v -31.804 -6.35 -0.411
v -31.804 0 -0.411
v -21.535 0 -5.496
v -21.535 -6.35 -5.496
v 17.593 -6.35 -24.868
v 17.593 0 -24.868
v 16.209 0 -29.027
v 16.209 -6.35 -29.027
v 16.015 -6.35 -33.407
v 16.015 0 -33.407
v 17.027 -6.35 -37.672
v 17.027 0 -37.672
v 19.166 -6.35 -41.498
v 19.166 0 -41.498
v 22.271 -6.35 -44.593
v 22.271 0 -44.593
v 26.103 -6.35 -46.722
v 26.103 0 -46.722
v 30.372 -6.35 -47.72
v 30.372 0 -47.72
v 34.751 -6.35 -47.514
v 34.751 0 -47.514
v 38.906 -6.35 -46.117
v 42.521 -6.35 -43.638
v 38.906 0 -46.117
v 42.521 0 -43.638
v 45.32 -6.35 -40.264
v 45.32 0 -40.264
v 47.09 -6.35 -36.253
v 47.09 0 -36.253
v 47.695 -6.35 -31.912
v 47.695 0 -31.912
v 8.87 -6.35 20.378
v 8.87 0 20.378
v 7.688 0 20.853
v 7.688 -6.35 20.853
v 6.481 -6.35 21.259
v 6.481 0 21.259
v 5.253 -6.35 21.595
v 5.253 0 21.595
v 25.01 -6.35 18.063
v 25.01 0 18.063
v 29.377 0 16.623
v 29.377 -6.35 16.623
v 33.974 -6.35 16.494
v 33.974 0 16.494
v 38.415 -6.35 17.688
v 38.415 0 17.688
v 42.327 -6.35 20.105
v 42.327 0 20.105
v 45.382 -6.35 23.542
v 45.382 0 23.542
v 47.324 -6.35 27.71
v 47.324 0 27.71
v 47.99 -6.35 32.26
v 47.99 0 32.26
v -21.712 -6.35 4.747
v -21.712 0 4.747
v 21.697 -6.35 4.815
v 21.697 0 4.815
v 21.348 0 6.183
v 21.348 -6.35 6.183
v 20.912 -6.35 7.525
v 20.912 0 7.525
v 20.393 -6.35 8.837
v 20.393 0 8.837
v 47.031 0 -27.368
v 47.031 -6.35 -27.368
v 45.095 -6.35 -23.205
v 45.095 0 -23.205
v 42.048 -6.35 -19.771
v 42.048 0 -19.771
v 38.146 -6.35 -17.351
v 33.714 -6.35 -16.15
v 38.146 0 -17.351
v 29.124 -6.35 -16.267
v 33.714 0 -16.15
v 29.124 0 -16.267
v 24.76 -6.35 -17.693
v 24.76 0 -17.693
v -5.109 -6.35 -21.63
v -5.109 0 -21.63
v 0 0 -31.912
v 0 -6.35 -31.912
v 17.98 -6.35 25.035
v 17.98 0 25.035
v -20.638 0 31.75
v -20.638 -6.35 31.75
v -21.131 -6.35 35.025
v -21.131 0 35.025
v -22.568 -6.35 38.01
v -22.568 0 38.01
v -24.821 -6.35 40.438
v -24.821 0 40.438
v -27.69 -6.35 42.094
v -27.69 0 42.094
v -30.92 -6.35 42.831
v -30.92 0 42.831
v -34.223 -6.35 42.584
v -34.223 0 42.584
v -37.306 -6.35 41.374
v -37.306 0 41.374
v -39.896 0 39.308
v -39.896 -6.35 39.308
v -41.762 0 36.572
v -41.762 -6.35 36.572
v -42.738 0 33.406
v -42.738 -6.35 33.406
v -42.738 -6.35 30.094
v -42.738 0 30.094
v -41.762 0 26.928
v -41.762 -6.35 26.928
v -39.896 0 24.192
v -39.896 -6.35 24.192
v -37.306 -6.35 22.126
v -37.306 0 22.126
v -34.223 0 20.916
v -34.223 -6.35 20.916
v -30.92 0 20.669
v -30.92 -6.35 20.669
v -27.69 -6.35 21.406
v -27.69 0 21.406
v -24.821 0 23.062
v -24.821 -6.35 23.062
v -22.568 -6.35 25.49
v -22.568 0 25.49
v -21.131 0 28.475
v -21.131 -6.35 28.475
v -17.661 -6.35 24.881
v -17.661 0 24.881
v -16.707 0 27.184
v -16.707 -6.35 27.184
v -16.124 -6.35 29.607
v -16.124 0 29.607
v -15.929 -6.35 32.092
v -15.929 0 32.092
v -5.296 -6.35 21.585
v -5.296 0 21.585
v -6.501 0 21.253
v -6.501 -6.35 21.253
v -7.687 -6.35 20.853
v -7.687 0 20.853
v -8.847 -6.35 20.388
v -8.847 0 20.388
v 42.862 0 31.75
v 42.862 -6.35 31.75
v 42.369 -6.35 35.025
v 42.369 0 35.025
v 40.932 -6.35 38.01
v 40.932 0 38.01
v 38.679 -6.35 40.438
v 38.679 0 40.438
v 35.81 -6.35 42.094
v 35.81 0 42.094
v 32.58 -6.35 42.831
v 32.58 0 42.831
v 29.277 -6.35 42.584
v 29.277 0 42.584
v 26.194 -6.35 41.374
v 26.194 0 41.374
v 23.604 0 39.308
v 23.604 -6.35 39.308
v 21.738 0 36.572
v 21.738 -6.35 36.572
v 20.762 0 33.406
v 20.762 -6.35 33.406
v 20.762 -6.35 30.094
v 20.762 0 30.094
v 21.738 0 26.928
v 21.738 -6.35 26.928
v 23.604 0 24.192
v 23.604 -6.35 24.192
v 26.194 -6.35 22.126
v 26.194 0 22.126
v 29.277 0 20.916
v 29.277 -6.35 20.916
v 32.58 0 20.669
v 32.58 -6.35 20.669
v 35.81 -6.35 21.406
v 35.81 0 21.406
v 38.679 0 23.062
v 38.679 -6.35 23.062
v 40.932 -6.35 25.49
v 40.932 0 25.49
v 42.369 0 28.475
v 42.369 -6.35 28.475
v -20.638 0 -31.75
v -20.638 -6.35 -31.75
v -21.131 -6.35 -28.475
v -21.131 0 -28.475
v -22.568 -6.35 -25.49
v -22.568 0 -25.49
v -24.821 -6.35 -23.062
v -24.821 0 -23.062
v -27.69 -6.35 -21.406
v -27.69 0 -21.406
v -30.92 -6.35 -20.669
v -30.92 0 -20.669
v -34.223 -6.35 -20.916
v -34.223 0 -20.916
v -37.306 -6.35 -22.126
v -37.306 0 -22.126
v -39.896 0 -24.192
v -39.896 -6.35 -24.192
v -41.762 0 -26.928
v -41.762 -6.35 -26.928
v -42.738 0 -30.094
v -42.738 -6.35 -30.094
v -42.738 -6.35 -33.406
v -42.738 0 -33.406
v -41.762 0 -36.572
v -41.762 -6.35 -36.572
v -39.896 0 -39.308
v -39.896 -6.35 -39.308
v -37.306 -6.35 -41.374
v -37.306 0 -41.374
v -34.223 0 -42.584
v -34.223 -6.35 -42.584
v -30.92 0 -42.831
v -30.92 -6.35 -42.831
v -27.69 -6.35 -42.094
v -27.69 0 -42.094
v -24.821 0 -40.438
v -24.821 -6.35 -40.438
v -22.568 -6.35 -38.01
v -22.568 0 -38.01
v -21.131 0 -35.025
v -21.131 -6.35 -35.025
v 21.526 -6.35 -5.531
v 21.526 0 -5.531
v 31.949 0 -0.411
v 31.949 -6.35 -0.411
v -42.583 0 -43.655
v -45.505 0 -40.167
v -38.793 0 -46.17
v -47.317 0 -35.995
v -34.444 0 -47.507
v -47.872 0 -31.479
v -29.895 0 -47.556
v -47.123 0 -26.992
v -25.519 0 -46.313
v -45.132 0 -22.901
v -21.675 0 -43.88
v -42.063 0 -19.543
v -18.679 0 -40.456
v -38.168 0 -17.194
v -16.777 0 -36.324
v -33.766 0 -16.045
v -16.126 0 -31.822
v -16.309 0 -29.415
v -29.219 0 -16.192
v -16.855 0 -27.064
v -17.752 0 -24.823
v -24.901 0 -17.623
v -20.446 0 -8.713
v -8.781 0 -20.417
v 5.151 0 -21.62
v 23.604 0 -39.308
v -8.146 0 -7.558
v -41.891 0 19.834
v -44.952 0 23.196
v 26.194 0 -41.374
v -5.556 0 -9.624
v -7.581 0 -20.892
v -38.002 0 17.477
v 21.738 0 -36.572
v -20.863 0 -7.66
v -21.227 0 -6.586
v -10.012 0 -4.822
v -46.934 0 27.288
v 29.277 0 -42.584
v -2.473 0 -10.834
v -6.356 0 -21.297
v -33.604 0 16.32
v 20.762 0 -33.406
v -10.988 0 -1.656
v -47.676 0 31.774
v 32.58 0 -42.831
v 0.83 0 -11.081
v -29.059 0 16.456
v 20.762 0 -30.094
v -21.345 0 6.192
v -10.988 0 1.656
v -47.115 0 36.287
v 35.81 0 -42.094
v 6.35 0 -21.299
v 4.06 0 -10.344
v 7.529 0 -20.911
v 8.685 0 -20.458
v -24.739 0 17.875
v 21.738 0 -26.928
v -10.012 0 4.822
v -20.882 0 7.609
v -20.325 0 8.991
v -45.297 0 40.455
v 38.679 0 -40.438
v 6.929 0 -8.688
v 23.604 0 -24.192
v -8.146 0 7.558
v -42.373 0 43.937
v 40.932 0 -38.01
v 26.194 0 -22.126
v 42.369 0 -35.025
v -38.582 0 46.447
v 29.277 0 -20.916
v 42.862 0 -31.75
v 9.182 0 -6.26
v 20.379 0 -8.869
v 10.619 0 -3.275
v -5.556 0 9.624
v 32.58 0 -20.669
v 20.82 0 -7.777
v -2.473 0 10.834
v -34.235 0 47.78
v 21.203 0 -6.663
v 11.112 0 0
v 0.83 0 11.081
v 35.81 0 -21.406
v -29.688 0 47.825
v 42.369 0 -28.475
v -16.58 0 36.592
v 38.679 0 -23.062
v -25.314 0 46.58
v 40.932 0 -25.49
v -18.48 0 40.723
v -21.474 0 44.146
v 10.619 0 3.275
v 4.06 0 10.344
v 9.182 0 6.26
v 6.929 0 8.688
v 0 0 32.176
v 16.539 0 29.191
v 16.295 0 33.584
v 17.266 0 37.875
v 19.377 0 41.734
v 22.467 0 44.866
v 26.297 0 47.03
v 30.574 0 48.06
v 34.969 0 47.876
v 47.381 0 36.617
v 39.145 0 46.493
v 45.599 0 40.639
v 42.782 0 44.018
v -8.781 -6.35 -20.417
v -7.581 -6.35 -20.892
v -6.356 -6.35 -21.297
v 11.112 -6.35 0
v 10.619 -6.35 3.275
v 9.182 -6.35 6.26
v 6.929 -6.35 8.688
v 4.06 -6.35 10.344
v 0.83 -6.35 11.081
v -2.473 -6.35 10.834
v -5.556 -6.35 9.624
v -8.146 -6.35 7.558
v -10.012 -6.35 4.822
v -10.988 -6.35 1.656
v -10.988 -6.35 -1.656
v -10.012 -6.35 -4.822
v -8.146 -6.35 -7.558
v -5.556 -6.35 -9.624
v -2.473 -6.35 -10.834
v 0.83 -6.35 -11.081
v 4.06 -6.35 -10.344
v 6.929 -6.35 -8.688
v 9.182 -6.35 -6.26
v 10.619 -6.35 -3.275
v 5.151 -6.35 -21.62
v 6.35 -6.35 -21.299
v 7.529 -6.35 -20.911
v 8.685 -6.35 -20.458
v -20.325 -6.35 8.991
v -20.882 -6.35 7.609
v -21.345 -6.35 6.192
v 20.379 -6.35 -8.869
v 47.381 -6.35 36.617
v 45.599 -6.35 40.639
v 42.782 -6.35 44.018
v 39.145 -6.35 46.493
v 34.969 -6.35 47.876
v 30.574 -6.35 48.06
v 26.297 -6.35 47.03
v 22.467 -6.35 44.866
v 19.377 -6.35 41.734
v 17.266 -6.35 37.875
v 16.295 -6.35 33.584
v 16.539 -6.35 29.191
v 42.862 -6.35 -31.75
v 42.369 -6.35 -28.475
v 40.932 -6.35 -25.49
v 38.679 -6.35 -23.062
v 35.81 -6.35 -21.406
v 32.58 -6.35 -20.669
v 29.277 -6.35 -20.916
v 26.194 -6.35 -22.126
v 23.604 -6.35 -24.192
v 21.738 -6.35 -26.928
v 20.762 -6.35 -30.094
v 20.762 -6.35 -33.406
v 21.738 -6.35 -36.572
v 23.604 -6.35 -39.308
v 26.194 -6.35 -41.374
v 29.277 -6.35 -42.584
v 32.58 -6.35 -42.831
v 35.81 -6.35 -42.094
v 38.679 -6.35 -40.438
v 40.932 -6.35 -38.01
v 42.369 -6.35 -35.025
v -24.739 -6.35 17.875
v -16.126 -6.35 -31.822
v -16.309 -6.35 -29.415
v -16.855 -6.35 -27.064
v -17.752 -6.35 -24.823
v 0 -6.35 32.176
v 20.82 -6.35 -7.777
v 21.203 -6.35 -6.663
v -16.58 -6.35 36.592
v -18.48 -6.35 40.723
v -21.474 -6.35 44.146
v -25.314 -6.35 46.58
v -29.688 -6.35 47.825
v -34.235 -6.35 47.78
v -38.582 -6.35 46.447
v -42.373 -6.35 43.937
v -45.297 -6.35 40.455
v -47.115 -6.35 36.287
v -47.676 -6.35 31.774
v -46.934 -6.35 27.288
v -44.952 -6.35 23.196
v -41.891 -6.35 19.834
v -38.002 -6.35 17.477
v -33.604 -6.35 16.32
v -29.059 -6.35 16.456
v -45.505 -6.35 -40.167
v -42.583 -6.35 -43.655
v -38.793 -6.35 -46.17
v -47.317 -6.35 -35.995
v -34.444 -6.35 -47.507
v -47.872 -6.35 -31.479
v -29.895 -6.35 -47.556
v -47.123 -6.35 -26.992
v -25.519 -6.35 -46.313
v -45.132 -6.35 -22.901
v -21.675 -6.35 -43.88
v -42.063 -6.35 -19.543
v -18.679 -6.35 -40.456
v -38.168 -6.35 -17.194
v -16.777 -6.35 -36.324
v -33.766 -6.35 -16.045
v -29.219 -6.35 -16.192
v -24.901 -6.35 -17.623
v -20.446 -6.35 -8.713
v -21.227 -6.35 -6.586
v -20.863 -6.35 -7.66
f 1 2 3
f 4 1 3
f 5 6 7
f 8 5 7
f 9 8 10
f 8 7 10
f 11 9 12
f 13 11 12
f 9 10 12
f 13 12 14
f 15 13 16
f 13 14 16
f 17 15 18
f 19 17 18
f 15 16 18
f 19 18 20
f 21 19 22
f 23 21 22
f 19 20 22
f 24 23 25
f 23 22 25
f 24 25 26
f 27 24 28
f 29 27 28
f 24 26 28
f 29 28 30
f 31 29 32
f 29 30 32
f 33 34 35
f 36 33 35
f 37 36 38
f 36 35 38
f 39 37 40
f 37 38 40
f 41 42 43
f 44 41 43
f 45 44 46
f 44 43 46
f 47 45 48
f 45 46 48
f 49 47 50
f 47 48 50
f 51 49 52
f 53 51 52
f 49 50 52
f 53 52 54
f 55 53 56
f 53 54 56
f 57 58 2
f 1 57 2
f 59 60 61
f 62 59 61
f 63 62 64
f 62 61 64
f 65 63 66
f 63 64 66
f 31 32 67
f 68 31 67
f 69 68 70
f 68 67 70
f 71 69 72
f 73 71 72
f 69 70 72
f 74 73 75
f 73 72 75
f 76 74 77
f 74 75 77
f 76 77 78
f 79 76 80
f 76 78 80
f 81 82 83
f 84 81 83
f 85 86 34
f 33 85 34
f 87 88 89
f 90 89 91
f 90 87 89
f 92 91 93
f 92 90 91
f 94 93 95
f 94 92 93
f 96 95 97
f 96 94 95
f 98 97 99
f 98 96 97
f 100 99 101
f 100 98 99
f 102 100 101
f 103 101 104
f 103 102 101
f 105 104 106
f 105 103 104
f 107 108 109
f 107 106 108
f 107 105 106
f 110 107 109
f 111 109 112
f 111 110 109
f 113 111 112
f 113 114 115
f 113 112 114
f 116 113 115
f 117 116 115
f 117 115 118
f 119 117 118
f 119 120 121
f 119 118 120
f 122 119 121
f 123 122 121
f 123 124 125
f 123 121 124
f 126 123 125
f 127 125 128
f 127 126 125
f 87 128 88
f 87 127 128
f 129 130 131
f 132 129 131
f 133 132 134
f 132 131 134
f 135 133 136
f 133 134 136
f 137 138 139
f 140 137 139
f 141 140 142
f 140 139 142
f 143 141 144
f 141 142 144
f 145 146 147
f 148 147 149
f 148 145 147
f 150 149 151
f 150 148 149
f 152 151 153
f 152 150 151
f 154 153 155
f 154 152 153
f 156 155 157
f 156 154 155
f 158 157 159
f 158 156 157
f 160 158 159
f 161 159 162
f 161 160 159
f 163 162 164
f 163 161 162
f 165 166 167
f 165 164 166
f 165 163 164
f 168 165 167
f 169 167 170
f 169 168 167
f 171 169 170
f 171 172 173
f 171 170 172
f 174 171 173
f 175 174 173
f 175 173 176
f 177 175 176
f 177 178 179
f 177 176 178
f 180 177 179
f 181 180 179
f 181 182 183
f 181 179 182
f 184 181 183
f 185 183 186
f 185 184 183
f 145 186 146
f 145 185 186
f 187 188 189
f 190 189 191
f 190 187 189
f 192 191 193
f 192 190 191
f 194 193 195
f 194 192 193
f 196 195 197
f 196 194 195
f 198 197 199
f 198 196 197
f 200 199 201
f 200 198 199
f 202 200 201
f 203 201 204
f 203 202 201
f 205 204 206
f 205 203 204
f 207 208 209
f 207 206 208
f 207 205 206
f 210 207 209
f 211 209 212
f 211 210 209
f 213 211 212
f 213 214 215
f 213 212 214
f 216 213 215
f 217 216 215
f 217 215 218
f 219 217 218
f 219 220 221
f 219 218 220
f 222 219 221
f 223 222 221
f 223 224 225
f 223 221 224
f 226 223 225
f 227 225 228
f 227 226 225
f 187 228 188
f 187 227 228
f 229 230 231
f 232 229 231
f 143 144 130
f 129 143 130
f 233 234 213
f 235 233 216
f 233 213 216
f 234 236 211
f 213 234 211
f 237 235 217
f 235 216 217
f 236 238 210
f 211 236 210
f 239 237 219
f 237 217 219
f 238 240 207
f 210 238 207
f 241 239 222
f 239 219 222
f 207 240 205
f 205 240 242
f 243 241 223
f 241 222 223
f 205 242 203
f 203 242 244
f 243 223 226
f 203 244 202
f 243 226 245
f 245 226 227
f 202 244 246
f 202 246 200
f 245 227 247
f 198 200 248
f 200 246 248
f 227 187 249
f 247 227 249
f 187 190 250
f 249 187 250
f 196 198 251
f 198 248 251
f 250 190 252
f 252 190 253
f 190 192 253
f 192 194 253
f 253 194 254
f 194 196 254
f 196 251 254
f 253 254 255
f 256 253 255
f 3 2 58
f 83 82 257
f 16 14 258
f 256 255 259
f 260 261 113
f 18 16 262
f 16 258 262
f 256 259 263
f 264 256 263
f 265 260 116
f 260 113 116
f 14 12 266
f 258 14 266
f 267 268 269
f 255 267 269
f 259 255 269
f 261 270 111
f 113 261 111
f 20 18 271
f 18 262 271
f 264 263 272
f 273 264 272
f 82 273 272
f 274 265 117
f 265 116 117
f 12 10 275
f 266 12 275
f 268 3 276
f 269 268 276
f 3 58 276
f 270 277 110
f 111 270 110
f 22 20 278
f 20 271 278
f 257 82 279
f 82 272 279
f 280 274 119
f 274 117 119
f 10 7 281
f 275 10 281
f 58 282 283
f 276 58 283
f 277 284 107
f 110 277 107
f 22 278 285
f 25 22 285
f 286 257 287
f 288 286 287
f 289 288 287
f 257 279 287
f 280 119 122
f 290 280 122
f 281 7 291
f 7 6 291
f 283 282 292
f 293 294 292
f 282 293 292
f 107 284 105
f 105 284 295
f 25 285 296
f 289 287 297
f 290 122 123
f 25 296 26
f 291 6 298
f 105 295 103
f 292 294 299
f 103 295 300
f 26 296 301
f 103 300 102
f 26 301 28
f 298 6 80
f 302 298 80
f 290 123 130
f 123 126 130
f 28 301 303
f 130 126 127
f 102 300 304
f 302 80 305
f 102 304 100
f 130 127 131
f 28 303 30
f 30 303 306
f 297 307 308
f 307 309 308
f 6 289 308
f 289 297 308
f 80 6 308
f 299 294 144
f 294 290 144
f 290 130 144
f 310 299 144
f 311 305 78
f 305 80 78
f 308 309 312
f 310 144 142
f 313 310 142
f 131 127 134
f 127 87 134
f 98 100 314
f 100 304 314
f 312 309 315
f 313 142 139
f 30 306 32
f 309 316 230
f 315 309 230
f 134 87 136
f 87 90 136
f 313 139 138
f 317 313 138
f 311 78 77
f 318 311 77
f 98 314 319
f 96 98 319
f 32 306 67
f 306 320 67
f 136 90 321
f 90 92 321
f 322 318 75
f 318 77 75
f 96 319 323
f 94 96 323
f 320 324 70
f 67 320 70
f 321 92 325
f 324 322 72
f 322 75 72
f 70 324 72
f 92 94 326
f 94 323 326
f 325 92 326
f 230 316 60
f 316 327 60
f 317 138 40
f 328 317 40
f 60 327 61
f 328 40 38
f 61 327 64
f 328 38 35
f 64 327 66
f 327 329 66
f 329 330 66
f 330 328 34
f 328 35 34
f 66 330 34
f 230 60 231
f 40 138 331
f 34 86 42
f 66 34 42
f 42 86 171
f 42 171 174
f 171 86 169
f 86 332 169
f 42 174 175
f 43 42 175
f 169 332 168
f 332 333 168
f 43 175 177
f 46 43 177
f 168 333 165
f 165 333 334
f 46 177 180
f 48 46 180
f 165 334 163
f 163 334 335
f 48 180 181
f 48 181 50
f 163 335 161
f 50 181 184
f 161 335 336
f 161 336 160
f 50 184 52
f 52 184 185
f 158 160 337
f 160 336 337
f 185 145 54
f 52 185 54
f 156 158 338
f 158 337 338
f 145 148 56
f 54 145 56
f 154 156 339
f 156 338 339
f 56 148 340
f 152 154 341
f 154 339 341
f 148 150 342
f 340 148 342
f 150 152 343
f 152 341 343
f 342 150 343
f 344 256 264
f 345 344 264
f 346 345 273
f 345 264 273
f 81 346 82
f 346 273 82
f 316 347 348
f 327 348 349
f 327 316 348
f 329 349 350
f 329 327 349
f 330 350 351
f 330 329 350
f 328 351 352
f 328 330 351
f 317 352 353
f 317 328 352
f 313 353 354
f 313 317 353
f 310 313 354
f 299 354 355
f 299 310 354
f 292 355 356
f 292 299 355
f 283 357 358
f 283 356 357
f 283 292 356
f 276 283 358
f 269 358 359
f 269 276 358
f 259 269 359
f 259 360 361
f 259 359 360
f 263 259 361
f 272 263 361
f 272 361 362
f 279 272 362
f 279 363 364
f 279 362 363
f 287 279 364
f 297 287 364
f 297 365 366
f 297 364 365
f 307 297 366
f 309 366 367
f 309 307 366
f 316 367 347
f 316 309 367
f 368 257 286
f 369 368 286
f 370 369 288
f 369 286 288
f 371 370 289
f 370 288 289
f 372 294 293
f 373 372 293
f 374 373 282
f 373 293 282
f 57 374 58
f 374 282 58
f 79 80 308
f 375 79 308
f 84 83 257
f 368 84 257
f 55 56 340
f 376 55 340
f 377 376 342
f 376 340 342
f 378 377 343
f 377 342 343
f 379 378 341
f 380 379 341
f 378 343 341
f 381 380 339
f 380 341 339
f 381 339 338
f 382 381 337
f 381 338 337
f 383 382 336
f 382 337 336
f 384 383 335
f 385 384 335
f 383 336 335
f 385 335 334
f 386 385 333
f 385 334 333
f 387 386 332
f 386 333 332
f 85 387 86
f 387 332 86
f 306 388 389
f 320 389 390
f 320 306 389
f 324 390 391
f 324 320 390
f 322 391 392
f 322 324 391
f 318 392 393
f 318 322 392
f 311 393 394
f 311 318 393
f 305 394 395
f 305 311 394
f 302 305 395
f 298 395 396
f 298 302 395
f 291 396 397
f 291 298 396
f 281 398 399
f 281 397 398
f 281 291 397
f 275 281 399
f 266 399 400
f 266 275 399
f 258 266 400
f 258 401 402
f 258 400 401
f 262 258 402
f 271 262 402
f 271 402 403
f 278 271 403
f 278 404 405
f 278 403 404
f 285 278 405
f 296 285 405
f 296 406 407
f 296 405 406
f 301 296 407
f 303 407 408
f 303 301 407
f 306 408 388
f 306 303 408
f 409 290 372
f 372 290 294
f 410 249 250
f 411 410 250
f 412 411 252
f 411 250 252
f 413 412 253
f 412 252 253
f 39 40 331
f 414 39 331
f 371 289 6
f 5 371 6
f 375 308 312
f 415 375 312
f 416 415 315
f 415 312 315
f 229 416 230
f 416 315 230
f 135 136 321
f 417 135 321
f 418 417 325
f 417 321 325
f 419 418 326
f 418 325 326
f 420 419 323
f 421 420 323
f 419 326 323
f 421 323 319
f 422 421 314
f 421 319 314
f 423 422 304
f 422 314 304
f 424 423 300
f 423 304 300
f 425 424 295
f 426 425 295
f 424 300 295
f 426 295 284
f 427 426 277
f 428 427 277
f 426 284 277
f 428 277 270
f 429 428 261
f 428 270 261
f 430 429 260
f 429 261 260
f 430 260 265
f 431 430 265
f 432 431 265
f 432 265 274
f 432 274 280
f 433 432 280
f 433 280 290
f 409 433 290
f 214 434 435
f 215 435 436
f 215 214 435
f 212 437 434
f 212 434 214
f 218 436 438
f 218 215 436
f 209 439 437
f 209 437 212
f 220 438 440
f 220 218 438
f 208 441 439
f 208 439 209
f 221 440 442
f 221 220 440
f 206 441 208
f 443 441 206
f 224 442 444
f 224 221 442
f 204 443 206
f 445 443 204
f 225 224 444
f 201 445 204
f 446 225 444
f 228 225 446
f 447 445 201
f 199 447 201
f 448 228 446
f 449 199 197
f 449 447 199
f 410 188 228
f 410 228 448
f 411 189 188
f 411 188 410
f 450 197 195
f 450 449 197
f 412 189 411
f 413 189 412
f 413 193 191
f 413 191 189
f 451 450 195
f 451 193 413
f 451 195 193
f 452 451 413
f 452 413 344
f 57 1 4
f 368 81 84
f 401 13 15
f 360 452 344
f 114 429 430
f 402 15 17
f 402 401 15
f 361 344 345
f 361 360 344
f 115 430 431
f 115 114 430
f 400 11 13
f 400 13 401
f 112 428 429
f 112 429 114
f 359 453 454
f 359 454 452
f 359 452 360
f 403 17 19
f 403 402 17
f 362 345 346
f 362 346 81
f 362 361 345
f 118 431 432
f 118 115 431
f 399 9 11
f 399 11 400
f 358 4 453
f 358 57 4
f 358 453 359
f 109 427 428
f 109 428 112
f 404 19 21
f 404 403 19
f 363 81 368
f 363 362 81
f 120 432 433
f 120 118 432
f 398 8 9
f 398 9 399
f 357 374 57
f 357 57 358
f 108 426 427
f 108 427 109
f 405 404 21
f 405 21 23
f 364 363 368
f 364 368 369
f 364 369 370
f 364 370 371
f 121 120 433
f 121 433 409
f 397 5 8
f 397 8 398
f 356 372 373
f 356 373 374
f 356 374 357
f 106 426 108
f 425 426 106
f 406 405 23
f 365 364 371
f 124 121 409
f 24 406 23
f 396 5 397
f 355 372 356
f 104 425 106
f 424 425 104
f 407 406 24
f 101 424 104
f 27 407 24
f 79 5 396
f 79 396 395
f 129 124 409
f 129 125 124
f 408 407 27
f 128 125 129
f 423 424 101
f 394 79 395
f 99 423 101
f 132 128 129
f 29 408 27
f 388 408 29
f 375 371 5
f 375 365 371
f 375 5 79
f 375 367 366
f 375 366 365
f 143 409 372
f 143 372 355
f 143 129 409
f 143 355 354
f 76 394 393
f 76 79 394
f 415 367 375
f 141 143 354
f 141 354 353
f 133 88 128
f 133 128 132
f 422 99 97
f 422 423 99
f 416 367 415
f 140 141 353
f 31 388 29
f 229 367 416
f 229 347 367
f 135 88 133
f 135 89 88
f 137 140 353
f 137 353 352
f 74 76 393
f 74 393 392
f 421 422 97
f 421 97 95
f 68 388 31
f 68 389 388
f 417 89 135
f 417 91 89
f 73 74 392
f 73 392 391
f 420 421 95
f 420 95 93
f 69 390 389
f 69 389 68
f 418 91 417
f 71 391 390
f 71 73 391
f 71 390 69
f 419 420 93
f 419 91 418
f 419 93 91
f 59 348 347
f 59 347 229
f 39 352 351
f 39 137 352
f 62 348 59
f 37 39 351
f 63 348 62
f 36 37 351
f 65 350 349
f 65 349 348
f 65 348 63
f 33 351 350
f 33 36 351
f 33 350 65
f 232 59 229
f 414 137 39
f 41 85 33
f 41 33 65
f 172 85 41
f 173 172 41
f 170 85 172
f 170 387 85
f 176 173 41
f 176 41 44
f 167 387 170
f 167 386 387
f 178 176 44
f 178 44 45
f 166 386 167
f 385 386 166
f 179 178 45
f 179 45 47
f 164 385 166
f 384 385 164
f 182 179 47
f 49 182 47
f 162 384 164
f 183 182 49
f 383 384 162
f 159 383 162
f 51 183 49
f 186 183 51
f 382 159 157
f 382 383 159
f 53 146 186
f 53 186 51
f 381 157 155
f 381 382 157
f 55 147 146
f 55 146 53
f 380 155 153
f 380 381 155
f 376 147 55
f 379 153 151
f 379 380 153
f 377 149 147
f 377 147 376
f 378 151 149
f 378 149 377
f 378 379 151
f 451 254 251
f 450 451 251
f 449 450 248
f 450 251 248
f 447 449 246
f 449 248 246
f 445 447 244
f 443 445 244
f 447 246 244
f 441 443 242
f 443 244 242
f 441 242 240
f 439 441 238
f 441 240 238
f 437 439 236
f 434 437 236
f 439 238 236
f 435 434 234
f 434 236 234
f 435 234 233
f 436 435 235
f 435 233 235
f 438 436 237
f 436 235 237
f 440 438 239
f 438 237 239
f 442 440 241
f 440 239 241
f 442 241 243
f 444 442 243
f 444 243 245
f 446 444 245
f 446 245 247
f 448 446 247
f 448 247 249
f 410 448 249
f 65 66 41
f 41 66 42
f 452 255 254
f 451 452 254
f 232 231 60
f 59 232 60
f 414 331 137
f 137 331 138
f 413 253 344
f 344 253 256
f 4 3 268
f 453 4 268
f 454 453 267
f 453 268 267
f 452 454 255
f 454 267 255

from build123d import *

# Parameters (mm, degrees)
F1_DEPTH = 6.35
F2_R     = 11.1125
F3_DEPTH = 6.351
F4_R     = 21.59
F5_DEPTH = 6.35
F6_R     = 11.1125
F7_DEPTH = 6.351


with BuildPart() as f1:
    # F0 (on Front) → F1 (new body)
    with BuildSketch(Plane.XZ):
        with BuildLine():
            ThreePointArc((21.5257779082, -5.5309592701), (22.0495015704, -2.787490896), (22.225, 0))
            ThreePointArc((22.225, 0), (22.0926198885, 2.4221419162), (21.6970565613, 4.8154295316))
            Line((21.6970565613, 4.8154295316), (19.0545663115, 6.1626660745))
            Line((19.0545663115, 6.1626660745), (15.9729558223, 0.0050951573))
            Line((15.9729558223, 0.0050951573), (19.2714315866, -6.6382280738))
            Line((19.2714315866, -6.6382280738), (21.5257779082, -5.5309592701))
        make_face()
        with BuildLine():
            ThreePointArc((21.6970565613, 4.8154295316), (22.0926198885, 2.4221419162), (22.225, 0))
            ThreePointArc((22.225, 0), (22.0495015704, -2.787490896), (21.5257779082, -5.5309592701))
            Line((21.5257779082, -5.5309592701), (31.9489983919, -0.411379033))
            Line((31.9489983919, -0.411379033), (21.6970565613, 4.8154295316))
        make_face()
        with BuildLine():
            Line((19.0545663115, 6.1626660745), (21.6970565613, 4.8154295316))
            ThreePointArc((21.6970565613, 4.8154295316), (21.1407372397, 6.8571024464), (20.3927661329, 8.836612159))
            Line((20.3927661329, 8.836612159), (19.0545663115, 6.1626660745))
        make_face()
        with BuildLine():
            ThreePointArc((20.3788557045, -8.8686450586), (21.0186730351, -7.2226040208), (21.5257779082, -5.5309592701))
            Line((21.5257779082, -5.5309592701), (19.2714315866, -6.6382280738))
            Line((19.2714315866, -6.6382280738), (20.3788557045, -8.8686450586))
        make_face()
        with BuildLine():
            Line((19.0545663115, 6.1626660745), (20.3927661329, 8.836612159))
            ThreePointArc((20.3927661329, 8.836612159), (18.3482240517, 12.5416625352), (15.6384904833, 15.7920309144))
            Line((15.6384904833, 15.7920309144), (10.6233306163, 10.7795534064))
            Line((10.6233306163, 10.7795534064), (10.8349616789, 10.3533160607))
            Line((10.8349616789, 10.3533160607), (19.0545663115, 6.1626660745))
        make_face()
        with BuildLine():
            ThreePointArc((15.6384904833, 15.7920309144), (18.3482240517, 12.5416625352), (20.3927661329, 8.836612159))
            Line((20.3927661329, 8.836612159), (25.0104148101, 18.0634431618))
            ThreePointArc((25.0104148101, 18.0634431618), (22.8287799548, 19.3843441725), (20.8868182159, 21.0375515781))
            Line((20.8868182159, 21.0375515781), (15.6384904833, 15.7920309144))
        make_face()
        with BuildLine():
            Line((24.7600884642, -17.6927042464), (20.3788557045, -8.8686450586))
            ThreePointArc((20.3788557045, -8.8686450586), (18.3698756369, -12.509927821), (15.7177018967, -15.7131942038))
            Line((15.7177018967, -15.7131942038), (20.628024747, -20.6528413462))
            ThreePointArc((20.628024747, -20.6528413462), (22.5748134031, -19.0063208739), (24.7600884642, -17.6927042464))
        make_face()
        with BuildLine():
            ThreePointArc((15.7177018967, -15.7131942038), (18.3698756369, -12.509927821), (20.3788557045, -8.8686450586))
            Line((20.3788557045, -8.8686450586), (19.2714315866, -6.6382280738))
            Line((19.2714315866, -6.6382280738), (10.8220572797, -10.7883129526))
            Line((10.8220572797, -10.7883129526), (15.7177018967, -15.7131942038))
        make_face()
        with BuildLine():
            Line((10.6233306163, 10.7795534064), (15.6384904833, 15.7920309144))
            ThreePointArc((15.6384904833, 15.7920309144), (12.4668681814, 18.3991255974), (8.8698123462, 20.3783476745))
            Line((8.8698123462, 20.3783476745), (6.4671831136, 19.1502777135))
            Line((6.4671831136, 19.1502777135), (10.6233306163, 10.7795534064))
        make_face()
        with BuildLine():
            ThreePointArc((8.8698123462, 20.3783476745), (12.4668681814, 18.3991255974), (15.6384904833, 15.7920309144))
            Line((15.6384904833, 15.7920309144), (20.8868182159, 21.0375515781))
            ThreePointArc((20.8868182159, 21.0375515781), (19.2767105193, 22.9222920615), (17.9796318988, 25.0347031334))
            Line((17.9796318988, 25.0347031334), (8.8698123462, 20.3783476745))
        make_face()
        with BuildLine():
            Line((32.1151407006, 32.2598685929), (25.0104148101, 18.0634431618))
            ThreePointArc((25.0104148101, 18.0634431618), (40.4586442059, 18.7542558984), (47.9901407006, 32.2598685929))
            ThreePointArc((47.9901407006, 32.2598685929), (28.3993350831, 47.6938704594), (17.9796318988, 25.0347031334))
            Line((17.9796318988, 25.0347031334), (32.1151407006, 32.2598685929))
        make_face()
        with BuildLine():
            ThreePointArc((20.8868182159, 21.0375515781), (22.8287799548, 19.3843441725), (25.0104148101, 18.0634431618))
            Line((25.0104148101, 18.0634431618), (32.1151407006, 32.2598685929))
            Line((32.1151407006, 32.2598685929), (20.8868182159, 21.0375515781))
        make_face()
        with BuildLine():
            Line((20.628024747, -20.6528413462), (15.7177018967, -15.7131942038))
            ThreePointArc((15.7177018967, -15.7131942038), (12.4300167123, -18.4240416177), (8.6854055581, -20.4576234028))
            Line((8.6854055581, -20.4576234028), (17.5930772423, -24.8678233961))
            ThreePointArc((17.5930772423, -24.8678233961), (18.9370013071, -22.6353699906), (20.628024747, -20.6528413462))
        make_face()
        with BuildLine():
            ThreePointArc((8.6854055581, -20.4576234028), (12.4300167123, -18.4240416177), (15.7177018967, -15.7131942038))
            Line((15.7177018967, -15.7131942038), (10.8220572797, -10.7883129526))
            Line((10.8220572797, -10.7883129526), (10.4895712426, -10.9516203438))
            Line((10.4895712426, -10.9516203438), (6.3186403483, -19.2858348275))
            Line((6.3186403483, -19.2858348275), (8.6854055581, -20.4576234028))
        make_face()
        with BuildLine():
            Line((31.8198764616, -31.9115304439), (24.7600884642, -17.6927042464))
            ThreePointArc((24.7600884642, -17.6927042464), (22.5748134031, -19.0063208739), (20.628024747, -20.6528413462))
            Line((20.628024747, -20.6528413462), (31.8198764616, -31.9115304439))
        make_face()
        with BuildLine():
            ThreePointArc((47.6948764616, -31.9115304439), (40.1847282398, -18.4191296297), (24.7600884642, -17.6927042464))
            Line((24.7600884642, -17.6927042464), (31.8198764616, -31.9115304439))
            Line((31.8198764616, -31.9115304439), (17.5930772423, -24.8678233961))
            ThreePointArc((17.5930772423, -24.8678233961), (28.2028896359, -47.3689892034), (47.6948764616, -31.9115304439))
        make_face()
        with BuildLine():
            Line((6.4671831136, 19.1502777135), (8.8698123462, 20.3783476745))
            ThreePointArc((8.8698123462, 20.3783476745), (7.0876895336, 21.0645503649), (5.2532383322, 21.5952335487))
            Line((5.2532383322, 21.5952335487), (6.4671831136, 19.1502777135))
        make_face()
        with BuildLine():
            ThreePointArc((17.9796318988, 25.0347031334), (19.2767105193, 22.9222920615), (20.8868182159, 21.0375515781))
            Line((20.8868182159, 21.0375515781), (32.1151407006, 32.2598685929))
            Line((32.1151407006, 32.2598685929), (17.9796318988, 25.0347031334))
        make_face()
        with BuildLine():
            ThreePointArc((5.1505038225, -21.619966128), (6.9423236203, -21.1129052418), (8.6854055581, -20.4576234028))
            Line((8.6854055581, -20.4576234028), (6.3186403483, -19.2858348275))
            Line((6.3186403483, -19.2858348275), (5.1505038225, -21.619966128))
        make_face()
        with BuildLine():
            Line((31.8198764616, -31.9115304439), (20.628024747, -20.6528413462))
            ThreePointArc((20.628024747, -20.6528413462), (18.9370013071, -22.6353699906), (17.5930772423, -24.8678233961))
            Line((17.5930772423, -24.8678233961), (31.8198764616, -31.9115304439))
        make_face()
        with BuildLine():
            Line((6.4671831136, 19.1502777135), (5.2532383322, 21.5952335487))
            ThreePointArc((5.2532383322, 21.5952335487), (-0.0218444781, 22.2249892648), (-5.2956791501, 21.5848652379))
            Line((-5.2956791501, 21.5848652379), (-6.4940514809, 19.1882700525))
            Line((-6.4940514809, 19.1882700525), (0.0320288973, 15.8610396236))
            Line((0.0320288973, 15.8610396236), (6.4671831136, 19.1502777135))
        make_face()
        with BuildLine():
            ThreePointArc((-5.2956791501, 21.5848652379), (-0.0218444781, 22.2249892648), (5.2532383322, 21.5952335487))
            Line((5.2532383322, 21.5952335487), (0, 32.1755629932))
            Line((0, 32.1755629932), (-5.2956791501, 21.5848652379))
        make_face()
        with BuildLine():
            Line((0, -31.9115304439), (5.1505038225, -21.619966128))
            ThreePointArc((5.1505038225, -21.619966128), (0.0213004103, -22.2249897929), (-5.1090532865, -21.6297988783))
            Line((-5.1090532865, -21.6297988783), (0, -31.9115304439))
        make_face()
        with BuildLine():
            ThreePointArc((-5.1090532865, -21.6297988783), (0.0213004103, -22.2249897929), (5.1505038225, -21.619966128))
            Line((5.1505038225, -21.619966128), (6.3186403483, -19.2858348275))
            Line((6.3186403483, -19.2858348275), (-0.054424676, -16.1305219328))
            Line((-0.054424676, -16.1305219328), (-6.3139432909, -19.2050139139))
            Line((-6.3139432909, -19.2050139139), (-5.1090532865, -21.6297988783))
        make_face()
        with BuildLine():
            Line((-6.4940514809, 19.1882700525), (-5.2956791501, 21.5848652379))
            ThreePointArc((-5.2956791501, 21.5848652379), (-7.096810048, 21.0614793436), (-8.8473961867, 20.3880898006))
            Line((-8.8473961867, 20.3880898006), (-6.4940514809, 19.1882700525))
        make_face()
        with BuildLine():
            Line((-10.6715967815, 10.8337005282), (-6.4940514809, 19.1882700525))
            Line((-6.4940514809, 19.1882700525), (-8.8473961867, 20.3880898006))
            ThreePointArc((-8.8473961867, 20.3880898006), (-12.4455878153, 18.4135267923), (-15.6193303309, 15.8109817853))
            Line((-15.6193303309, 15.8109817853), (-10.6715967815, 10.8337005282))
        make_face()
        with BuildLine():
            ThreePointArc((-8.781015481, -20.4167674259), (-6.9714678453, -21.1032997676), (-5.1090532865, -21.6297988783))
            Line((-5.1090532865, -21.6297988783), (-6.3139432909, -19.2050139139))
            Line((-6.3139432909, -19.2050139139), (-8.781015481, -20.4167674259))
        make_face()
        with BuildLine():
            Line((-8.781015481, -20.4167674259), (-6.3139432909, -19.2050139139))
            Line((-6.3139432909, -19.2050139139), (-10.3826021382, -11.0170276563))
            Line((-10.3826021382, -11.0170276563), (-10.9191345383, -10.7513897577))
            Line((-10.9191345383, -10.7513897577), (-15.8003951401, -15.6300396166))
            ThreePointArc((-15.8003951401, -15.6300396166), (-12.5215665079, -18.361944265), (-8.781015481, -20.4167674259))
        make_face()
        with BuildLine():
            ThreePointArc((-15.6193303309, 15.8109817853), (-12.4455878153, 18.4135267923), (-8.8473961867, 20.3880898006))
            Line((-8.8473961867, 20.3880898006), (-17.6608186057, 24.8814894457))
            ThreePointArc((-17.6608186057, 24.8814894457), (-18.9756819297, 22.7402956748), (-20.6119186423, 20.8333856755))
            Line((-20.6119186423, 20.8333856755), (-15.6193303309, 15.8109817853))
        make_face()
        with BuildLine():
            Line((-15.8003951401, -15.6300396166), (-10.9191345383, -10.7513897577))
            Line((-10.9191345383, -10.7513897577), (-19.3721379739, -6.5662966137))
            Line((-19.3721379739, -6.5662966137), (-20.445734464, -8.7133556812))
            ThreePointArc((-20.445734464, -8.7133556812), (-18.4500841999, -12.3913283394), (-15.8003951401, -15.6300396166))
        make_face()
        with BuildLine():
            Line((-19.3721379739, -6.5662966137), (-15.9725433879, 0.2324685173))
            Line((-15.9725433879, 0.2324685173), (-18.9239192092, 6.1719747706))
            Line((-18.9239192092, 6.1719747706), (-21.7121749395, 4.7467972777))
            ThreePointArc((-21.7121749395, 4.7467972777), (-22.2216698648, -0.3847251214), (-21.5348488072, -5.4955356291))
            Line((-21.5348488072, -5.4955356291), (-19.3721379739, -6.5662966137))
        make_face()
        with BuildLine():
            Line((-10.9696125578, 10.2377061481), (-10.6715967815, 10.8337005282))
            Line((-10.6715967815, 10.8337005282), (-15.6193303309, 15.8109817853))
            ThreePointArc((-15.6193303309, 15.8109817853), (-18.2927375193, 12.6224553495), (-20.324953245, 8.9914904543))
            Line((-20.324953245, 8.9914904543), (-18.9239192092, 6.1719747706))
            Line((-18.9239192092, 6.1719747706), (-10.9696125578, 10.2377061481))
        make_face()
        with BuildLine():
            Line((-17.7515357784, -24.8228239325), (-8.781015481, -20.4167674259))
            ThreePointArc((-8.781015481, -20.4167674259), (-12.5215665079, -18.361944265), (-15.8003951401, -15.6300396166))
            Line((-15.8003951401, -15.6300396166), (-20.7722118543, -20.5991971539))
            ThreePointArc((-20.7722118543, -20.5991971539), (-19.0880122112, -22.5866672669), (-17.7515357784, -24.8228239325))
        make_face()
        with BuildLine():
            ThreePointArc((-20.324953245, 8.9914904543), (-18.2927375193, 12.6224553495), (-15.6193303309, 15.8109817853))
            Line((-15.6193303309, 15.8109817853), (-20.6119186423, 20.8333856755))
            ThreePointArc((-20.6119186423, 20.8333856755), (-22.556657753, 19.1883337074), (-24.7394661231, 17.875491826))
            Line((-24.7394661231, 17.875491826), (-20.324953245, 8.9914904543))
        make_face()
        with BuildLine():
            Line((-31.8037703569, 32.0920747732), (-17.6608186057, 24.8814894457))
            ThreePointArc((-17.6608186057, 24.8814894457), (-16.3678547046, 28.3842272877), (-15.9287703569, 32.0920747732))
            ThreePointArc((-15.9287703569, 32.0920747732), (-45.2974995433, 40.4547835236), (-24.7394661231, 17.875491826))
            Line((-24.7394661231, 17.875491826), (-31.8037703569, 32.0920747732))
        make_face()
        with BuildLine():
            ThreePointArc((-20.6119186423, 20.8333856755), (-18.9756819297, 22.7402956748), (-17.6608186057, 24.8814894457))
            Line((-17.6608186057, 24.8814894457), (-31.8037703569, 32.0920747732))
            Line((-31.8037703569, 32.0920747732), (-20.6119186423, 20.8333856755))
        make_face()
        with BuildLine():
            Line((-20.7722118543, -20.5991971539), (-15.8003951401, -15.6300396166))
            ThreePointArc((-15.8003951401, -15.6300396166), (-18.4500841999, -12.3913283394), (-20.445734464, -8.7133556812))
            Line((-20.445734464, -8.7133556812), (-24.900664278, -17.6226596333))
            ThreePointArc((-24.900664278, -17.6226596333), (-22.716375551, -18.9444018915), (-20.7722118543, -20.5991971539))
        make_face()
        with BuildLine():
            Line((-20.445734464, -8.7133556812), (-19.3721379739, -6.5662966137))
            Line((-19.3721379739, -6.5662966137), (-21.5348488072, -5.4955356291))
            ThreePointArc((-21.5348488072, -5.4955356291), (-21.0518629679, -7.1252852982), (-20.445734464, -8.7133556812))
        make_face()
        with BuildLine():
            Line((-21.7121749395, 4.7467972777), (-18.9239192092, 6.1719747706))
            Line((-18.9239192092, 6.1719747706), (-20.324953245, 8.9914904543))
            ThreePointArc((-20.324953245, 8.9914904543), (-21.1254441738, 6.9040736858), (-21.7121749395, 4.7467972777))
        make_face()
        with BuildLine():
            Line((-32.000534339, -31.8215141687), (-17.7515357784, -24.8228239325))
            ThreePointArc((-17.7515357784, -24.8228239325), (-19.0880122112, -22.5866672669), (-20.7722118543, -20.5991971539))
            Line((-20.7722118543, -20.5991971539), (-32.000534339, -31.8215141687))
        make_face()
        with BuildLine():
            ThreePointArc((-16.125534339, -31.8215141687), (-16.5373768809, -28.2289682155), (-17.7515357784, -24.8228239325))
            Line((-17.7515357784, -24.8228239325), (-32.000534339, -31.8215141687))
            Line((-32.000534339, -31.8215141687), (-24.900664278, -17.6226596333))
            ThreePointArc((-24.900664278, -17.6226596333), (-45.5047200274, -40.1673271243), (-16.125534339, -31.8215141687))
        make_face()
        with BuildLine():
            ThreePointArc((-24.7394661231, 17.875491826), (-22.556657753, 19.1883337074), (-20.6119186423, 20.8333856755))
            Line((-20.6119186423, 20.8333856755), (-31.8037703569, 32.0920747732))
            Line((-31.8037703569, 32.0920747732), (-24.7394661231, 17.875491826))
        make_face()
        with BuildLine():
            Line((-32.000534339, -31.8215141687), (-20.7722118543, -20.5991971539))
            ThreePointArc((-20.7722118543, -20.5991971539), (-22.716375551, -18.9444018915), (-24.900664278, -17.6226596333))
            Line((-24.900664278, -17.6226596333), (-32.000534339, -31.8215141687))
        make_face()
        with BuildLine():
            Line((-31.8037703569, -0.411379033), (-21.5348488072, -5.4955356291))
            ThreePointArc((-21.5348488072, -5.4955356291), (-22.2216698648, -0.3847251214), (-21.7121749395, 4.7467972777))
            Line((-21.7121749395, 4.7467972777), (-31.8037703569, -0.411379033))
        make_face()
    extrude(amount=F1_DEPTH)

    # F2 (on Front) → F3 (cut, through all)
    with BuildSketch(Plane.XZ):
        with Locations((-31.75, 31.75)):
            Circle(F2_R)
        with Locations((31.75, 31.75)):
            Circle(F2_R)
        with Locations((31.75, -31.75)):
            Circle(F2_R)
        with Locations((-31.75, -31.75)):
            Circle(F2_R)
        Circle(F2_R)
    extrude(amount=F3_DEPTH, mode=Mode.SUBTRACT)

    # F4 (on Front) → F5 (join)
    with BuildSketch(Plane.XZ):
        Circle(F4_R)
    extrude(amount=F5_DEPTH)

    # F6 (on Front) → F7 (cut, through all)
    with BuildSketch(Plane.XZ):
        Circle(F6_R)
    extrude(amount=F7_DEPTH, mode=Mode.SUBTRACT)


solid = f1.part
